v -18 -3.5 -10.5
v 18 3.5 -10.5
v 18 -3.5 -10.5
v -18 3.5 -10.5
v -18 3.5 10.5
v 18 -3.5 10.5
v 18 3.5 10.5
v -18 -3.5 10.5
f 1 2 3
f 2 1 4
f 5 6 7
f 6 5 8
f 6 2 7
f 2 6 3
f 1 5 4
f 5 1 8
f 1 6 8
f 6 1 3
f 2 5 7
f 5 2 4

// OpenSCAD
module rounded_prism() {
    difference() {
        // Main block with rounded edges
        hull() {
            translate([-18, -9.5, -10.5]) cube([36, 1, 21]);
            translate([-18, 8.5, -10.5]) cube([36, 1, 21]);
            translate([-18, -9.5, -10.5]) cube([1, 19, 21]);
            translate([17, -9.5, -10.5]) cube([1, 19, 21]);
        }
        // Side cutouts
        translate([-18, -9.5, -10.5]) cube([36, 6, 21]);
        translate([-18, 3.5, -10.5]) cube([36, 6, 21]);
    }
}

rounded_prism();
